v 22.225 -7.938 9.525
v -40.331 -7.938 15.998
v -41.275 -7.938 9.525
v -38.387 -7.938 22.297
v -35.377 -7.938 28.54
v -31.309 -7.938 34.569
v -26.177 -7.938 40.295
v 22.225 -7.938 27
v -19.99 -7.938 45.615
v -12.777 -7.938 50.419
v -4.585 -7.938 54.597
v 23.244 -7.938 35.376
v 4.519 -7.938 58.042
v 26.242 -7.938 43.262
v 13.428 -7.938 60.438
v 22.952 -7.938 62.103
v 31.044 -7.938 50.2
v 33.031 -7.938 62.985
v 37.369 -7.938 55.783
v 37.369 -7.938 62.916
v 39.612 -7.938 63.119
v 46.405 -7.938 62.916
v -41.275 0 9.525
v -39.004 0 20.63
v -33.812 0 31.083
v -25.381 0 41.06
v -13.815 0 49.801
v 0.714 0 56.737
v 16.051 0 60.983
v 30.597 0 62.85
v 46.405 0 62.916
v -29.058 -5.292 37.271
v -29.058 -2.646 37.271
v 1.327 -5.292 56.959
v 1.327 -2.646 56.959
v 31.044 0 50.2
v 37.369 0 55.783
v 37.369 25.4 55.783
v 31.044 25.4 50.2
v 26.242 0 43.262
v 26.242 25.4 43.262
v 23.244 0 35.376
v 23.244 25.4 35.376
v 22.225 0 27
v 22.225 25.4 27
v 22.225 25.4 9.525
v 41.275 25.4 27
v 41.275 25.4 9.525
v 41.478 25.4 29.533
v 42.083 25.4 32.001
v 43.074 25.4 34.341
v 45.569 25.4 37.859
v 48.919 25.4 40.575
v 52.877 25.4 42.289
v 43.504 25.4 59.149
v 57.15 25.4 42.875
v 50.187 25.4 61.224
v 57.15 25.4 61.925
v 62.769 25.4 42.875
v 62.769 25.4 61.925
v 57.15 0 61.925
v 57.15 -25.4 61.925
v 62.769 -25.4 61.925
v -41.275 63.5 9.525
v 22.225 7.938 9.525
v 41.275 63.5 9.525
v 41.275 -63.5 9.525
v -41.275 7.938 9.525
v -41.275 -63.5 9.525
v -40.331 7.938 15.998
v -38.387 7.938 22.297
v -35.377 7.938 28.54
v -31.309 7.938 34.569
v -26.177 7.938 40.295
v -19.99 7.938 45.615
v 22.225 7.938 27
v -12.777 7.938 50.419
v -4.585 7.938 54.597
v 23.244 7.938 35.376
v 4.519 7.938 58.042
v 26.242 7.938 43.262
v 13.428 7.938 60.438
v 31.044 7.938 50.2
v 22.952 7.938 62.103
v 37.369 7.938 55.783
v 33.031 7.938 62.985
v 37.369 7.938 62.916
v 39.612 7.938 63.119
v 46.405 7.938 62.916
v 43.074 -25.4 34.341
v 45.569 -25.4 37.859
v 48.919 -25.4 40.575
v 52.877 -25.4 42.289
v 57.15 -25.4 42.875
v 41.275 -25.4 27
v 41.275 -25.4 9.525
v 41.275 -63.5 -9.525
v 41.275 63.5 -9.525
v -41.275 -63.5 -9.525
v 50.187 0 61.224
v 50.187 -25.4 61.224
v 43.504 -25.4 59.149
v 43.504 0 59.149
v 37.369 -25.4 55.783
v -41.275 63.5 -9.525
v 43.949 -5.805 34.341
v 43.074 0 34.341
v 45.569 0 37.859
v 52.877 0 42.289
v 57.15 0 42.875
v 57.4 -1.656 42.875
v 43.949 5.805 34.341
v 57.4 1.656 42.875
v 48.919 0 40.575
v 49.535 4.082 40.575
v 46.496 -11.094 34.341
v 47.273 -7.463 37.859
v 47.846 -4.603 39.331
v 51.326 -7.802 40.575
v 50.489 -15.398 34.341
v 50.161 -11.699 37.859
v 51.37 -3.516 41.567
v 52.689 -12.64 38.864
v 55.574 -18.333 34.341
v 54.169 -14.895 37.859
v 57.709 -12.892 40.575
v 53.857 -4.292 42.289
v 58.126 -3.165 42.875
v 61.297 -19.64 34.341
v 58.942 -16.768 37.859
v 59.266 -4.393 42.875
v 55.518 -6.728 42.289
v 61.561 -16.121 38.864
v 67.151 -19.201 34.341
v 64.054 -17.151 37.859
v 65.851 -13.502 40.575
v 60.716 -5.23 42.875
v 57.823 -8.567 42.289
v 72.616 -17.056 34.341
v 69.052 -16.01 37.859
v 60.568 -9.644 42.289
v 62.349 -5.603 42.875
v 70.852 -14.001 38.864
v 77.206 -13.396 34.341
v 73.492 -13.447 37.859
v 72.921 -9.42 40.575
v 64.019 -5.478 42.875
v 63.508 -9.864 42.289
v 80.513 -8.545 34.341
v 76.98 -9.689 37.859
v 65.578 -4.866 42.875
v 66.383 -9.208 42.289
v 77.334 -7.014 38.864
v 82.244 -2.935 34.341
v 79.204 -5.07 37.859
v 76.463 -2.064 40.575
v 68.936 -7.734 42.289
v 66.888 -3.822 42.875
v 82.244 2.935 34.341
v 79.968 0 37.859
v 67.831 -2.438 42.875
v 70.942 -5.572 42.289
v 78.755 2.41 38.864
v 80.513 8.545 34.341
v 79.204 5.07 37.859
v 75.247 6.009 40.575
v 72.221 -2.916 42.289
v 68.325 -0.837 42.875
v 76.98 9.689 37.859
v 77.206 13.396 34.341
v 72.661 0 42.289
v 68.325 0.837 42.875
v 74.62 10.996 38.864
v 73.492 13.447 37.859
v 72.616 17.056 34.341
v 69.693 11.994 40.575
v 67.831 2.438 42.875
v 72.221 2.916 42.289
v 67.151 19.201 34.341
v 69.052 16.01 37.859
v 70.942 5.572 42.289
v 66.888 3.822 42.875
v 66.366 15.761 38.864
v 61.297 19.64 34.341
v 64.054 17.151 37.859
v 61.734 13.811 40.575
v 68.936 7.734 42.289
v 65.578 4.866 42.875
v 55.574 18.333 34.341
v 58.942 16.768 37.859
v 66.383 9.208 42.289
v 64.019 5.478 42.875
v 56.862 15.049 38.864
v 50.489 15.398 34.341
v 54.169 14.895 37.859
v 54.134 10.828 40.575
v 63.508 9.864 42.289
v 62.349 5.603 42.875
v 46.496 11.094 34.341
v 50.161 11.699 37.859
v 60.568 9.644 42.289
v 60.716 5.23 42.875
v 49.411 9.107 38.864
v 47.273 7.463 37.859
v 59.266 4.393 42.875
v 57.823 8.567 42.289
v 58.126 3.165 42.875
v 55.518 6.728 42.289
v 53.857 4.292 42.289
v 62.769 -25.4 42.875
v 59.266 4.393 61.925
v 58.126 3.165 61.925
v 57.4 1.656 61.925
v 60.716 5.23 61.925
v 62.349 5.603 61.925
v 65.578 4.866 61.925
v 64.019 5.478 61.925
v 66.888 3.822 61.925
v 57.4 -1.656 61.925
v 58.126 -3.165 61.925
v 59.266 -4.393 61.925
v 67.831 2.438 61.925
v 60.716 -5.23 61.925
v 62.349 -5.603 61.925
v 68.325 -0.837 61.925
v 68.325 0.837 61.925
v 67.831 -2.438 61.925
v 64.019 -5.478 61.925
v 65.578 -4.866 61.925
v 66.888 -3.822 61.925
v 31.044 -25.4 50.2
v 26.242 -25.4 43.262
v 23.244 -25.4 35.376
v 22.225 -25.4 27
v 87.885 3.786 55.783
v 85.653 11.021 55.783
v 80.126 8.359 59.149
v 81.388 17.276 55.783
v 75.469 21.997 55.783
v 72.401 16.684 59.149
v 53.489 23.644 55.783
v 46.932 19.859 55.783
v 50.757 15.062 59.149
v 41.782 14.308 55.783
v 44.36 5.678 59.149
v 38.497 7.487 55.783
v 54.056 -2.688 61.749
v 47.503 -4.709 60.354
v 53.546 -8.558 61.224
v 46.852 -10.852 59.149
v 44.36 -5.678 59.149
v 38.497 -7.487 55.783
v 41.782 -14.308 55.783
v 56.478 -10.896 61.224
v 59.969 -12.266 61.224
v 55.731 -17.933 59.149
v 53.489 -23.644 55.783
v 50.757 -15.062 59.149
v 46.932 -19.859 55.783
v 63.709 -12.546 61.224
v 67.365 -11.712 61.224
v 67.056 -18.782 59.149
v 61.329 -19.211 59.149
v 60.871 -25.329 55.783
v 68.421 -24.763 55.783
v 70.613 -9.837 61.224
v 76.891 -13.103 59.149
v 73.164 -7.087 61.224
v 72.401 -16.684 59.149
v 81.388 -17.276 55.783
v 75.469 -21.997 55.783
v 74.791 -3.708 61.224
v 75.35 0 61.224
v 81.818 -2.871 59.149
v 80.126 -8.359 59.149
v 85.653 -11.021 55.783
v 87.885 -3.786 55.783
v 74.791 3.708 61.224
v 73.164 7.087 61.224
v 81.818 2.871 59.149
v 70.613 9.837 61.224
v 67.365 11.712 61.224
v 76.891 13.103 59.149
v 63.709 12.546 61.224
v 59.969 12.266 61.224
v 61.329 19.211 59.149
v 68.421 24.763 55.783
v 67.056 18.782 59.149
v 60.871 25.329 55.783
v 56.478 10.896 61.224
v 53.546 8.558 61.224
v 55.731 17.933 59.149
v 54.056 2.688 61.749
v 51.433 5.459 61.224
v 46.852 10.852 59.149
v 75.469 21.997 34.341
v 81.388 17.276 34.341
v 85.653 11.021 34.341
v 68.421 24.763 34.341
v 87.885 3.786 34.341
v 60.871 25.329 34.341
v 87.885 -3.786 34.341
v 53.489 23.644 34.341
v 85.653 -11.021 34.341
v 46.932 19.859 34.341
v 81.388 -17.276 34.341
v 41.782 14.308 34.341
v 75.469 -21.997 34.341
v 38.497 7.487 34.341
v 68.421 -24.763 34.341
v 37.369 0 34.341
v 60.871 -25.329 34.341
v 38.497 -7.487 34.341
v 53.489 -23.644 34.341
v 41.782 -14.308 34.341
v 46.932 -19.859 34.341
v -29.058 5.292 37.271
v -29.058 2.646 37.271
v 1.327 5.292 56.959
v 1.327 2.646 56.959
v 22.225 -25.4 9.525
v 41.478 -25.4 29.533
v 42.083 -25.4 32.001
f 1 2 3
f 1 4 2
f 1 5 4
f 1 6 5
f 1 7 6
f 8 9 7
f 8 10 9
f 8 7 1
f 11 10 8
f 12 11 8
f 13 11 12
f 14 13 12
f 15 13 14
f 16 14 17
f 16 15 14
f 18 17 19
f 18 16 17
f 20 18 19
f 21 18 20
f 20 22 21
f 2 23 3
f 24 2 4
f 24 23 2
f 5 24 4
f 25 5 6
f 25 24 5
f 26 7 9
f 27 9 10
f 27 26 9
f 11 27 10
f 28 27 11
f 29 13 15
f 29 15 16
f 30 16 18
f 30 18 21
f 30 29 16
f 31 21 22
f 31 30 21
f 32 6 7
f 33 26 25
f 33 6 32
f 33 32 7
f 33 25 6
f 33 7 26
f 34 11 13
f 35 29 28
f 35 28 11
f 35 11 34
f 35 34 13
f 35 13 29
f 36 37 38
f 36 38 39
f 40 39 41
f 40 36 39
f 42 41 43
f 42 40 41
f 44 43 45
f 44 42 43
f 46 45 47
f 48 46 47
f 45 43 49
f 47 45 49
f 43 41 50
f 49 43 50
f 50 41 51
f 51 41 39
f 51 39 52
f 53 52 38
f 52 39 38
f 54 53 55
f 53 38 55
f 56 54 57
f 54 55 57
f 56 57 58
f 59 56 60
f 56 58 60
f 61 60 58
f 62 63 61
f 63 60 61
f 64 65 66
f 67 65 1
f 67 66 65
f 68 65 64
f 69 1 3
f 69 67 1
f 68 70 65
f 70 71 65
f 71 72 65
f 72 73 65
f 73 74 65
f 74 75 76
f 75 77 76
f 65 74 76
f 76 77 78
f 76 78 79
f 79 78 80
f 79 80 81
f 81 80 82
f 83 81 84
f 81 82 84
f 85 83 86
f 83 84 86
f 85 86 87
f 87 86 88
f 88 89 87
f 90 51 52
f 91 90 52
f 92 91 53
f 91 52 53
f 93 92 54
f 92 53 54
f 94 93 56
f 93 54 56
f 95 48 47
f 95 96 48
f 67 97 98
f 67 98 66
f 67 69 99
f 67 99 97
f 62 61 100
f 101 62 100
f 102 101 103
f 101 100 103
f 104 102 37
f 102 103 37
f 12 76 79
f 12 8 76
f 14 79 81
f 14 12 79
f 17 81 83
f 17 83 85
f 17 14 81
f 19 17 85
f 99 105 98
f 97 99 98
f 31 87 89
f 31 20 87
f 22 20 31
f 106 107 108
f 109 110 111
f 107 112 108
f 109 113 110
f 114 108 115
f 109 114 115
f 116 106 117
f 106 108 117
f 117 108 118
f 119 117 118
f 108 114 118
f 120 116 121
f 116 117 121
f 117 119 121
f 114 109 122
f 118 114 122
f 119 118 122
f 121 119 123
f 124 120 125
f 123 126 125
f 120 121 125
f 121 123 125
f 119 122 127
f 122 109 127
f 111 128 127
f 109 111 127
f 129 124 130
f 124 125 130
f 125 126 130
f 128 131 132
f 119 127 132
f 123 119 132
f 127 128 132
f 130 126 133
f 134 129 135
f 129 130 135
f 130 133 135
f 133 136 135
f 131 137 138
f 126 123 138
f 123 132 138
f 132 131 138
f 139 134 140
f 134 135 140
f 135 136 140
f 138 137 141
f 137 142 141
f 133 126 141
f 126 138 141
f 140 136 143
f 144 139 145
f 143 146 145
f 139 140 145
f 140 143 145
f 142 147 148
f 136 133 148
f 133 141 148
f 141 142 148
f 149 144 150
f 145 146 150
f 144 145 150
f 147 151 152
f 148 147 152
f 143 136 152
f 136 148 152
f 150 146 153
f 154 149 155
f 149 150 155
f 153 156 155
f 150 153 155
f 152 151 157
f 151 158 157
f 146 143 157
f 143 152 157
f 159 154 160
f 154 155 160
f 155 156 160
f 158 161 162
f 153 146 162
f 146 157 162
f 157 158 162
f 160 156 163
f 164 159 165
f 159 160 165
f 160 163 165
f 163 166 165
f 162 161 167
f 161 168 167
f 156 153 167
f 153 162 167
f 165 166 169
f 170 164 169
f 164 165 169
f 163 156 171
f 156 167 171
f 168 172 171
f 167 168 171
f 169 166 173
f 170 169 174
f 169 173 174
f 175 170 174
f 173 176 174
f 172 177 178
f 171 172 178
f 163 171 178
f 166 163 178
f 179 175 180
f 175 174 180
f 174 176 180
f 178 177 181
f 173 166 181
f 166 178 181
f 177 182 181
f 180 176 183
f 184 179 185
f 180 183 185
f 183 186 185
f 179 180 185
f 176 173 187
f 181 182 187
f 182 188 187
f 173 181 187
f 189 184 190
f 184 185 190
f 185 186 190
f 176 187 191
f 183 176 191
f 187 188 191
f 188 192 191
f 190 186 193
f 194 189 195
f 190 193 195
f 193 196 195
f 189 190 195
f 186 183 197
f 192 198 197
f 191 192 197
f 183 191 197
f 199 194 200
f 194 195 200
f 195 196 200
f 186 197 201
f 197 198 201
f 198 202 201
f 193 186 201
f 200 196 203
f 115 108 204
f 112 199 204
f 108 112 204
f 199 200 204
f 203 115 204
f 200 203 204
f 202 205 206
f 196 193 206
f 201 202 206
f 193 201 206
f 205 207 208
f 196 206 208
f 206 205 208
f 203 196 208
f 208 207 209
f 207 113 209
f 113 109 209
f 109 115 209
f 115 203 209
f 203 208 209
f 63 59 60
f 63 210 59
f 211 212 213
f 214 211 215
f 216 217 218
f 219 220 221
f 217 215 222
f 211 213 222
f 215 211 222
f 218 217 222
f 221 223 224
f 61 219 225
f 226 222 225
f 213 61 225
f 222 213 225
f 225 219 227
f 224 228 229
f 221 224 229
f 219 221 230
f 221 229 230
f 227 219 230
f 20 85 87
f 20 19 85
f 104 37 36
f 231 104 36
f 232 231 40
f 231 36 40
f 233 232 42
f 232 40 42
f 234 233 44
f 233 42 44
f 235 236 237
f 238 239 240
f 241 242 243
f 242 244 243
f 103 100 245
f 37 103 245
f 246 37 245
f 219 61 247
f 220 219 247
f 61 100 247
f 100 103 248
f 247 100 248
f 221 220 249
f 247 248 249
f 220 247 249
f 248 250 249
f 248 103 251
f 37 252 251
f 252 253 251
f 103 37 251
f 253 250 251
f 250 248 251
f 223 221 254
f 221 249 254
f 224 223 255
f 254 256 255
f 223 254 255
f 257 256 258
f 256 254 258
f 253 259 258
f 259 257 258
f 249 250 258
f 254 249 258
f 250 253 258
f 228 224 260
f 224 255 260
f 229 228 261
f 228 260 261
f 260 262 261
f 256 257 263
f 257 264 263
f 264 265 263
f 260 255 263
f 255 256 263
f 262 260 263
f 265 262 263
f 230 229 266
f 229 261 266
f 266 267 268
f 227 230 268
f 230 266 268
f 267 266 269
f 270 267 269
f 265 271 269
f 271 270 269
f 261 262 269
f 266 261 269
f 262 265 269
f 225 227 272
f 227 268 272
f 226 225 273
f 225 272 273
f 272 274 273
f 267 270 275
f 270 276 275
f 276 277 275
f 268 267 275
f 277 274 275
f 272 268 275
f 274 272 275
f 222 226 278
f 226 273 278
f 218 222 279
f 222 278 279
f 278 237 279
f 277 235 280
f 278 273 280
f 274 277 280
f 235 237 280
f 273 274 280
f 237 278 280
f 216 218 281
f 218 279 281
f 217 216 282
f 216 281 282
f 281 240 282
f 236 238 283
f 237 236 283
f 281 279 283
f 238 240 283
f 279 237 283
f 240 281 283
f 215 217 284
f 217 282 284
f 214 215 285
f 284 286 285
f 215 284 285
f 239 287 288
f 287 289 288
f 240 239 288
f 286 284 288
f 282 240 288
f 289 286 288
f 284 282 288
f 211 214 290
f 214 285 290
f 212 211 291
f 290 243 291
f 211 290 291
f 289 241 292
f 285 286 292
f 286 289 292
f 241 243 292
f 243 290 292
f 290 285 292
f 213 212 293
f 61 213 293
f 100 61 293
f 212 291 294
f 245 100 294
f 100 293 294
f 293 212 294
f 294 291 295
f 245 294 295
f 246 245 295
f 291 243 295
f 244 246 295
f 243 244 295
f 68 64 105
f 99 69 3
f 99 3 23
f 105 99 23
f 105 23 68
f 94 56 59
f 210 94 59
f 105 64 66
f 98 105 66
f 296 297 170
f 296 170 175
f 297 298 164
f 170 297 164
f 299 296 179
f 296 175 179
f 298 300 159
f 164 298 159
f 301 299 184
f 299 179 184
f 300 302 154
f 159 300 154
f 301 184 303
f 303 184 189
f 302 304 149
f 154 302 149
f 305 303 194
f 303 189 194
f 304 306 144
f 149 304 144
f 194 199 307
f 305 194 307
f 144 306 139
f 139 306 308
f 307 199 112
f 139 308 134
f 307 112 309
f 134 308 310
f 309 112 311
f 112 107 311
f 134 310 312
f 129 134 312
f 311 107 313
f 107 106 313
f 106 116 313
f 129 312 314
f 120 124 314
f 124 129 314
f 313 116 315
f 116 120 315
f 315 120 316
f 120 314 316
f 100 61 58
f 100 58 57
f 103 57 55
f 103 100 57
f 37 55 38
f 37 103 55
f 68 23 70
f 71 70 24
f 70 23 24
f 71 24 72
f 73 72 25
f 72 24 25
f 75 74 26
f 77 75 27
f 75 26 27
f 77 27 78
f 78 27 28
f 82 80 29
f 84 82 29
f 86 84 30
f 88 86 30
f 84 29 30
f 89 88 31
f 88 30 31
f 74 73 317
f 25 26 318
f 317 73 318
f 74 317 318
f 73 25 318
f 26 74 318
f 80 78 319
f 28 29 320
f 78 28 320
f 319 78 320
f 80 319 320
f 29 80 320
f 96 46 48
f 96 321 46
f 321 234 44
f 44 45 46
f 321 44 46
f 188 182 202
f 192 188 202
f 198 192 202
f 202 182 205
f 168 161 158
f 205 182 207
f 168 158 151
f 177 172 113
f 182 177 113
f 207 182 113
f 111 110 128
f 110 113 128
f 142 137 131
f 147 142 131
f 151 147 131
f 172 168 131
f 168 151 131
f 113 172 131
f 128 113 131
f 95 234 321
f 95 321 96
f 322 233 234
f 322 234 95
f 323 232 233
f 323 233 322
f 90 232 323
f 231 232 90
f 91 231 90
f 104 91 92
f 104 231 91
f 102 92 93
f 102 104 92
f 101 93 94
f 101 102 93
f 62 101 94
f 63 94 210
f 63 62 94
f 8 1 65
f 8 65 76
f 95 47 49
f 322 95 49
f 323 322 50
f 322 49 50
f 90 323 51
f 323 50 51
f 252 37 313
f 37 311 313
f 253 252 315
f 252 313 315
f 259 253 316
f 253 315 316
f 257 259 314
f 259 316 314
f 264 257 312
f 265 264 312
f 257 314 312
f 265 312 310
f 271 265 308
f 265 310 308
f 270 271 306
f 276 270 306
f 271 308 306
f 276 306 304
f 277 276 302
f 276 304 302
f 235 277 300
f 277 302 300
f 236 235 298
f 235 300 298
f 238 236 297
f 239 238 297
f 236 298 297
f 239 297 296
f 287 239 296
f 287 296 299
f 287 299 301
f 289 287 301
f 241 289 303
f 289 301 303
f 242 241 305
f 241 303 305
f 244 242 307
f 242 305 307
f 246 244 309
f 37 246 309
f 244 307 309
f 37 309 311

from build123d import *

# Parameters (mm, degrees)
F1_DEPTH = 63.5
F2_DEPTH = 7.9375
F4_DEPTH = 25.4


with BuildPart() as f1:
    # F0 (on Front) → F1 (new body, symmetric)
    with BuildSketch(Plane.XZ):
        Polygon((22.225, 9.525), (-41.275, 9.525), (-41.275, -9.525), (41.275, -9.525), (41.275, 9.525), align=None)
    extrude(amount=F1_DEPTH, both=True)

    # F0 (on Front) → F2 (join, symmetric)
    with BuildSketch(Plane.XZ):
        with BuildLine():
            Line((37.3688169479, 62.9158), (46.4052697443, 62.9158))
            add(Edge.make_bspline(
                [(-41.275, 9.525), (-39.3016288695, 39.409199738), (-4.8606131009, 65.7163788111), (46.4052697443, 62.9158)],
                knots=[0, 0, 0, 0, 104.369664729, 104.369664729, 104.369664729, 104.369664729], degree=3))
            Line((-41.275, 9.525), (22.225, 9.525))
            Line((22.225, 9.525), (22.225, 18.3278894425))
            Line((22.225, 18.3278894425), (22.225, 27.0002))
            ThreePointArc((22.225, 27.0002), (26.2419634796, 43.2620849908), (37.3688169479, 55.7831884144))
            Line((37.3688169479, 55.7831884144), (37.3688169479, 62.9158))
        make_face()
    extrude(amount=F2_DEPTH, both=True)


with BuildPart() as f3:
    # F0 (on Front) → F3 (revolve)
    with BuildSketch(Plane.XZ):
        with BuildLine():
            Line((62.7688169479, 42.8752), (62.7688169479, 61.9252))
            Line((62.7688169479, 61.9252), (57.15, 61.9252))
            ThreePointArc((57.15, 61.9252), (46.7936069351, 60.3543713686), (37.3688169479, 55.7831884144))
            Line((37.3688169479, 55.7831884144), (37.3688169479, 34.3408))
            Line((37.3688169479, 34.3408), (43.0740909125, 34.3408))
            ThreePointArc((43.0740909125, 34.3408), (48.919459313, 40.5749495373), (57.15, 42.8752))
            Line((57.15, 42.8752), (62.7688169479, 42.8752))
        make_face()
    revolve(axis=Axis((62.7688169479, 0, 48.6283), (0, 0, 1)))


with BuildPart() as f4:
    # F0 (on Front) → F4 (new body, symmetric)
    with BuildSketch(Plane.XZ):
        with BuildLine():
            Line((62.7688169479, 42.8752), (62.7688169479, 61.9252))
            Line((62.7688169479, 61.9252), (57.15, 61.9252))
            ThreePointArc((57.15, 61.9252), (46.7936069351, 60.3543713686), (37.3688169479, 55.7831884144))
            Line((37.3688169479, 55.7831884144), (37.3688169479, 34.3408))
            Line((37.3688169479, 34.3408), (43.0740909125, 34.3408))
            ThreePointArc((43.0740909125, 34.3408), (48.919459313, 40.5749495373), (57.15, 42.8752))
            Line((57.15, 42.8752), (62.7688169479, 42.8752))
        make_face()
        with BuildLine():
            Line((37.3688169479, 34.3408), (37.3688169479, 55.7831884144))
            ThreePointArc((37.3688169479, 55.7831884144), (26.2419634796, 43.2620849908), (22.225, 27.0002))
            Line((22.225, 27.0002), (22.225, 18.3278894425))
            Line((22.225, 18.3278894425), (22.225, 9.525))
            Line((22.225, 9.525), (41.275, 9.525))
            Line((41.275, 9.525), (41.275, 27.0002))
            ThreePointArc((41.275, 27.0002), (41.7313314167, 30.7791263181), (43.0740909125, 34.3408))
            Line((43.0740909125, 34.3408), (37.3688169479, 34.3408))
        make_face()
    extrude(amount=F4_DEPTH, both=True)


solid = Compound([f1.part, f3.part, f4.part])
